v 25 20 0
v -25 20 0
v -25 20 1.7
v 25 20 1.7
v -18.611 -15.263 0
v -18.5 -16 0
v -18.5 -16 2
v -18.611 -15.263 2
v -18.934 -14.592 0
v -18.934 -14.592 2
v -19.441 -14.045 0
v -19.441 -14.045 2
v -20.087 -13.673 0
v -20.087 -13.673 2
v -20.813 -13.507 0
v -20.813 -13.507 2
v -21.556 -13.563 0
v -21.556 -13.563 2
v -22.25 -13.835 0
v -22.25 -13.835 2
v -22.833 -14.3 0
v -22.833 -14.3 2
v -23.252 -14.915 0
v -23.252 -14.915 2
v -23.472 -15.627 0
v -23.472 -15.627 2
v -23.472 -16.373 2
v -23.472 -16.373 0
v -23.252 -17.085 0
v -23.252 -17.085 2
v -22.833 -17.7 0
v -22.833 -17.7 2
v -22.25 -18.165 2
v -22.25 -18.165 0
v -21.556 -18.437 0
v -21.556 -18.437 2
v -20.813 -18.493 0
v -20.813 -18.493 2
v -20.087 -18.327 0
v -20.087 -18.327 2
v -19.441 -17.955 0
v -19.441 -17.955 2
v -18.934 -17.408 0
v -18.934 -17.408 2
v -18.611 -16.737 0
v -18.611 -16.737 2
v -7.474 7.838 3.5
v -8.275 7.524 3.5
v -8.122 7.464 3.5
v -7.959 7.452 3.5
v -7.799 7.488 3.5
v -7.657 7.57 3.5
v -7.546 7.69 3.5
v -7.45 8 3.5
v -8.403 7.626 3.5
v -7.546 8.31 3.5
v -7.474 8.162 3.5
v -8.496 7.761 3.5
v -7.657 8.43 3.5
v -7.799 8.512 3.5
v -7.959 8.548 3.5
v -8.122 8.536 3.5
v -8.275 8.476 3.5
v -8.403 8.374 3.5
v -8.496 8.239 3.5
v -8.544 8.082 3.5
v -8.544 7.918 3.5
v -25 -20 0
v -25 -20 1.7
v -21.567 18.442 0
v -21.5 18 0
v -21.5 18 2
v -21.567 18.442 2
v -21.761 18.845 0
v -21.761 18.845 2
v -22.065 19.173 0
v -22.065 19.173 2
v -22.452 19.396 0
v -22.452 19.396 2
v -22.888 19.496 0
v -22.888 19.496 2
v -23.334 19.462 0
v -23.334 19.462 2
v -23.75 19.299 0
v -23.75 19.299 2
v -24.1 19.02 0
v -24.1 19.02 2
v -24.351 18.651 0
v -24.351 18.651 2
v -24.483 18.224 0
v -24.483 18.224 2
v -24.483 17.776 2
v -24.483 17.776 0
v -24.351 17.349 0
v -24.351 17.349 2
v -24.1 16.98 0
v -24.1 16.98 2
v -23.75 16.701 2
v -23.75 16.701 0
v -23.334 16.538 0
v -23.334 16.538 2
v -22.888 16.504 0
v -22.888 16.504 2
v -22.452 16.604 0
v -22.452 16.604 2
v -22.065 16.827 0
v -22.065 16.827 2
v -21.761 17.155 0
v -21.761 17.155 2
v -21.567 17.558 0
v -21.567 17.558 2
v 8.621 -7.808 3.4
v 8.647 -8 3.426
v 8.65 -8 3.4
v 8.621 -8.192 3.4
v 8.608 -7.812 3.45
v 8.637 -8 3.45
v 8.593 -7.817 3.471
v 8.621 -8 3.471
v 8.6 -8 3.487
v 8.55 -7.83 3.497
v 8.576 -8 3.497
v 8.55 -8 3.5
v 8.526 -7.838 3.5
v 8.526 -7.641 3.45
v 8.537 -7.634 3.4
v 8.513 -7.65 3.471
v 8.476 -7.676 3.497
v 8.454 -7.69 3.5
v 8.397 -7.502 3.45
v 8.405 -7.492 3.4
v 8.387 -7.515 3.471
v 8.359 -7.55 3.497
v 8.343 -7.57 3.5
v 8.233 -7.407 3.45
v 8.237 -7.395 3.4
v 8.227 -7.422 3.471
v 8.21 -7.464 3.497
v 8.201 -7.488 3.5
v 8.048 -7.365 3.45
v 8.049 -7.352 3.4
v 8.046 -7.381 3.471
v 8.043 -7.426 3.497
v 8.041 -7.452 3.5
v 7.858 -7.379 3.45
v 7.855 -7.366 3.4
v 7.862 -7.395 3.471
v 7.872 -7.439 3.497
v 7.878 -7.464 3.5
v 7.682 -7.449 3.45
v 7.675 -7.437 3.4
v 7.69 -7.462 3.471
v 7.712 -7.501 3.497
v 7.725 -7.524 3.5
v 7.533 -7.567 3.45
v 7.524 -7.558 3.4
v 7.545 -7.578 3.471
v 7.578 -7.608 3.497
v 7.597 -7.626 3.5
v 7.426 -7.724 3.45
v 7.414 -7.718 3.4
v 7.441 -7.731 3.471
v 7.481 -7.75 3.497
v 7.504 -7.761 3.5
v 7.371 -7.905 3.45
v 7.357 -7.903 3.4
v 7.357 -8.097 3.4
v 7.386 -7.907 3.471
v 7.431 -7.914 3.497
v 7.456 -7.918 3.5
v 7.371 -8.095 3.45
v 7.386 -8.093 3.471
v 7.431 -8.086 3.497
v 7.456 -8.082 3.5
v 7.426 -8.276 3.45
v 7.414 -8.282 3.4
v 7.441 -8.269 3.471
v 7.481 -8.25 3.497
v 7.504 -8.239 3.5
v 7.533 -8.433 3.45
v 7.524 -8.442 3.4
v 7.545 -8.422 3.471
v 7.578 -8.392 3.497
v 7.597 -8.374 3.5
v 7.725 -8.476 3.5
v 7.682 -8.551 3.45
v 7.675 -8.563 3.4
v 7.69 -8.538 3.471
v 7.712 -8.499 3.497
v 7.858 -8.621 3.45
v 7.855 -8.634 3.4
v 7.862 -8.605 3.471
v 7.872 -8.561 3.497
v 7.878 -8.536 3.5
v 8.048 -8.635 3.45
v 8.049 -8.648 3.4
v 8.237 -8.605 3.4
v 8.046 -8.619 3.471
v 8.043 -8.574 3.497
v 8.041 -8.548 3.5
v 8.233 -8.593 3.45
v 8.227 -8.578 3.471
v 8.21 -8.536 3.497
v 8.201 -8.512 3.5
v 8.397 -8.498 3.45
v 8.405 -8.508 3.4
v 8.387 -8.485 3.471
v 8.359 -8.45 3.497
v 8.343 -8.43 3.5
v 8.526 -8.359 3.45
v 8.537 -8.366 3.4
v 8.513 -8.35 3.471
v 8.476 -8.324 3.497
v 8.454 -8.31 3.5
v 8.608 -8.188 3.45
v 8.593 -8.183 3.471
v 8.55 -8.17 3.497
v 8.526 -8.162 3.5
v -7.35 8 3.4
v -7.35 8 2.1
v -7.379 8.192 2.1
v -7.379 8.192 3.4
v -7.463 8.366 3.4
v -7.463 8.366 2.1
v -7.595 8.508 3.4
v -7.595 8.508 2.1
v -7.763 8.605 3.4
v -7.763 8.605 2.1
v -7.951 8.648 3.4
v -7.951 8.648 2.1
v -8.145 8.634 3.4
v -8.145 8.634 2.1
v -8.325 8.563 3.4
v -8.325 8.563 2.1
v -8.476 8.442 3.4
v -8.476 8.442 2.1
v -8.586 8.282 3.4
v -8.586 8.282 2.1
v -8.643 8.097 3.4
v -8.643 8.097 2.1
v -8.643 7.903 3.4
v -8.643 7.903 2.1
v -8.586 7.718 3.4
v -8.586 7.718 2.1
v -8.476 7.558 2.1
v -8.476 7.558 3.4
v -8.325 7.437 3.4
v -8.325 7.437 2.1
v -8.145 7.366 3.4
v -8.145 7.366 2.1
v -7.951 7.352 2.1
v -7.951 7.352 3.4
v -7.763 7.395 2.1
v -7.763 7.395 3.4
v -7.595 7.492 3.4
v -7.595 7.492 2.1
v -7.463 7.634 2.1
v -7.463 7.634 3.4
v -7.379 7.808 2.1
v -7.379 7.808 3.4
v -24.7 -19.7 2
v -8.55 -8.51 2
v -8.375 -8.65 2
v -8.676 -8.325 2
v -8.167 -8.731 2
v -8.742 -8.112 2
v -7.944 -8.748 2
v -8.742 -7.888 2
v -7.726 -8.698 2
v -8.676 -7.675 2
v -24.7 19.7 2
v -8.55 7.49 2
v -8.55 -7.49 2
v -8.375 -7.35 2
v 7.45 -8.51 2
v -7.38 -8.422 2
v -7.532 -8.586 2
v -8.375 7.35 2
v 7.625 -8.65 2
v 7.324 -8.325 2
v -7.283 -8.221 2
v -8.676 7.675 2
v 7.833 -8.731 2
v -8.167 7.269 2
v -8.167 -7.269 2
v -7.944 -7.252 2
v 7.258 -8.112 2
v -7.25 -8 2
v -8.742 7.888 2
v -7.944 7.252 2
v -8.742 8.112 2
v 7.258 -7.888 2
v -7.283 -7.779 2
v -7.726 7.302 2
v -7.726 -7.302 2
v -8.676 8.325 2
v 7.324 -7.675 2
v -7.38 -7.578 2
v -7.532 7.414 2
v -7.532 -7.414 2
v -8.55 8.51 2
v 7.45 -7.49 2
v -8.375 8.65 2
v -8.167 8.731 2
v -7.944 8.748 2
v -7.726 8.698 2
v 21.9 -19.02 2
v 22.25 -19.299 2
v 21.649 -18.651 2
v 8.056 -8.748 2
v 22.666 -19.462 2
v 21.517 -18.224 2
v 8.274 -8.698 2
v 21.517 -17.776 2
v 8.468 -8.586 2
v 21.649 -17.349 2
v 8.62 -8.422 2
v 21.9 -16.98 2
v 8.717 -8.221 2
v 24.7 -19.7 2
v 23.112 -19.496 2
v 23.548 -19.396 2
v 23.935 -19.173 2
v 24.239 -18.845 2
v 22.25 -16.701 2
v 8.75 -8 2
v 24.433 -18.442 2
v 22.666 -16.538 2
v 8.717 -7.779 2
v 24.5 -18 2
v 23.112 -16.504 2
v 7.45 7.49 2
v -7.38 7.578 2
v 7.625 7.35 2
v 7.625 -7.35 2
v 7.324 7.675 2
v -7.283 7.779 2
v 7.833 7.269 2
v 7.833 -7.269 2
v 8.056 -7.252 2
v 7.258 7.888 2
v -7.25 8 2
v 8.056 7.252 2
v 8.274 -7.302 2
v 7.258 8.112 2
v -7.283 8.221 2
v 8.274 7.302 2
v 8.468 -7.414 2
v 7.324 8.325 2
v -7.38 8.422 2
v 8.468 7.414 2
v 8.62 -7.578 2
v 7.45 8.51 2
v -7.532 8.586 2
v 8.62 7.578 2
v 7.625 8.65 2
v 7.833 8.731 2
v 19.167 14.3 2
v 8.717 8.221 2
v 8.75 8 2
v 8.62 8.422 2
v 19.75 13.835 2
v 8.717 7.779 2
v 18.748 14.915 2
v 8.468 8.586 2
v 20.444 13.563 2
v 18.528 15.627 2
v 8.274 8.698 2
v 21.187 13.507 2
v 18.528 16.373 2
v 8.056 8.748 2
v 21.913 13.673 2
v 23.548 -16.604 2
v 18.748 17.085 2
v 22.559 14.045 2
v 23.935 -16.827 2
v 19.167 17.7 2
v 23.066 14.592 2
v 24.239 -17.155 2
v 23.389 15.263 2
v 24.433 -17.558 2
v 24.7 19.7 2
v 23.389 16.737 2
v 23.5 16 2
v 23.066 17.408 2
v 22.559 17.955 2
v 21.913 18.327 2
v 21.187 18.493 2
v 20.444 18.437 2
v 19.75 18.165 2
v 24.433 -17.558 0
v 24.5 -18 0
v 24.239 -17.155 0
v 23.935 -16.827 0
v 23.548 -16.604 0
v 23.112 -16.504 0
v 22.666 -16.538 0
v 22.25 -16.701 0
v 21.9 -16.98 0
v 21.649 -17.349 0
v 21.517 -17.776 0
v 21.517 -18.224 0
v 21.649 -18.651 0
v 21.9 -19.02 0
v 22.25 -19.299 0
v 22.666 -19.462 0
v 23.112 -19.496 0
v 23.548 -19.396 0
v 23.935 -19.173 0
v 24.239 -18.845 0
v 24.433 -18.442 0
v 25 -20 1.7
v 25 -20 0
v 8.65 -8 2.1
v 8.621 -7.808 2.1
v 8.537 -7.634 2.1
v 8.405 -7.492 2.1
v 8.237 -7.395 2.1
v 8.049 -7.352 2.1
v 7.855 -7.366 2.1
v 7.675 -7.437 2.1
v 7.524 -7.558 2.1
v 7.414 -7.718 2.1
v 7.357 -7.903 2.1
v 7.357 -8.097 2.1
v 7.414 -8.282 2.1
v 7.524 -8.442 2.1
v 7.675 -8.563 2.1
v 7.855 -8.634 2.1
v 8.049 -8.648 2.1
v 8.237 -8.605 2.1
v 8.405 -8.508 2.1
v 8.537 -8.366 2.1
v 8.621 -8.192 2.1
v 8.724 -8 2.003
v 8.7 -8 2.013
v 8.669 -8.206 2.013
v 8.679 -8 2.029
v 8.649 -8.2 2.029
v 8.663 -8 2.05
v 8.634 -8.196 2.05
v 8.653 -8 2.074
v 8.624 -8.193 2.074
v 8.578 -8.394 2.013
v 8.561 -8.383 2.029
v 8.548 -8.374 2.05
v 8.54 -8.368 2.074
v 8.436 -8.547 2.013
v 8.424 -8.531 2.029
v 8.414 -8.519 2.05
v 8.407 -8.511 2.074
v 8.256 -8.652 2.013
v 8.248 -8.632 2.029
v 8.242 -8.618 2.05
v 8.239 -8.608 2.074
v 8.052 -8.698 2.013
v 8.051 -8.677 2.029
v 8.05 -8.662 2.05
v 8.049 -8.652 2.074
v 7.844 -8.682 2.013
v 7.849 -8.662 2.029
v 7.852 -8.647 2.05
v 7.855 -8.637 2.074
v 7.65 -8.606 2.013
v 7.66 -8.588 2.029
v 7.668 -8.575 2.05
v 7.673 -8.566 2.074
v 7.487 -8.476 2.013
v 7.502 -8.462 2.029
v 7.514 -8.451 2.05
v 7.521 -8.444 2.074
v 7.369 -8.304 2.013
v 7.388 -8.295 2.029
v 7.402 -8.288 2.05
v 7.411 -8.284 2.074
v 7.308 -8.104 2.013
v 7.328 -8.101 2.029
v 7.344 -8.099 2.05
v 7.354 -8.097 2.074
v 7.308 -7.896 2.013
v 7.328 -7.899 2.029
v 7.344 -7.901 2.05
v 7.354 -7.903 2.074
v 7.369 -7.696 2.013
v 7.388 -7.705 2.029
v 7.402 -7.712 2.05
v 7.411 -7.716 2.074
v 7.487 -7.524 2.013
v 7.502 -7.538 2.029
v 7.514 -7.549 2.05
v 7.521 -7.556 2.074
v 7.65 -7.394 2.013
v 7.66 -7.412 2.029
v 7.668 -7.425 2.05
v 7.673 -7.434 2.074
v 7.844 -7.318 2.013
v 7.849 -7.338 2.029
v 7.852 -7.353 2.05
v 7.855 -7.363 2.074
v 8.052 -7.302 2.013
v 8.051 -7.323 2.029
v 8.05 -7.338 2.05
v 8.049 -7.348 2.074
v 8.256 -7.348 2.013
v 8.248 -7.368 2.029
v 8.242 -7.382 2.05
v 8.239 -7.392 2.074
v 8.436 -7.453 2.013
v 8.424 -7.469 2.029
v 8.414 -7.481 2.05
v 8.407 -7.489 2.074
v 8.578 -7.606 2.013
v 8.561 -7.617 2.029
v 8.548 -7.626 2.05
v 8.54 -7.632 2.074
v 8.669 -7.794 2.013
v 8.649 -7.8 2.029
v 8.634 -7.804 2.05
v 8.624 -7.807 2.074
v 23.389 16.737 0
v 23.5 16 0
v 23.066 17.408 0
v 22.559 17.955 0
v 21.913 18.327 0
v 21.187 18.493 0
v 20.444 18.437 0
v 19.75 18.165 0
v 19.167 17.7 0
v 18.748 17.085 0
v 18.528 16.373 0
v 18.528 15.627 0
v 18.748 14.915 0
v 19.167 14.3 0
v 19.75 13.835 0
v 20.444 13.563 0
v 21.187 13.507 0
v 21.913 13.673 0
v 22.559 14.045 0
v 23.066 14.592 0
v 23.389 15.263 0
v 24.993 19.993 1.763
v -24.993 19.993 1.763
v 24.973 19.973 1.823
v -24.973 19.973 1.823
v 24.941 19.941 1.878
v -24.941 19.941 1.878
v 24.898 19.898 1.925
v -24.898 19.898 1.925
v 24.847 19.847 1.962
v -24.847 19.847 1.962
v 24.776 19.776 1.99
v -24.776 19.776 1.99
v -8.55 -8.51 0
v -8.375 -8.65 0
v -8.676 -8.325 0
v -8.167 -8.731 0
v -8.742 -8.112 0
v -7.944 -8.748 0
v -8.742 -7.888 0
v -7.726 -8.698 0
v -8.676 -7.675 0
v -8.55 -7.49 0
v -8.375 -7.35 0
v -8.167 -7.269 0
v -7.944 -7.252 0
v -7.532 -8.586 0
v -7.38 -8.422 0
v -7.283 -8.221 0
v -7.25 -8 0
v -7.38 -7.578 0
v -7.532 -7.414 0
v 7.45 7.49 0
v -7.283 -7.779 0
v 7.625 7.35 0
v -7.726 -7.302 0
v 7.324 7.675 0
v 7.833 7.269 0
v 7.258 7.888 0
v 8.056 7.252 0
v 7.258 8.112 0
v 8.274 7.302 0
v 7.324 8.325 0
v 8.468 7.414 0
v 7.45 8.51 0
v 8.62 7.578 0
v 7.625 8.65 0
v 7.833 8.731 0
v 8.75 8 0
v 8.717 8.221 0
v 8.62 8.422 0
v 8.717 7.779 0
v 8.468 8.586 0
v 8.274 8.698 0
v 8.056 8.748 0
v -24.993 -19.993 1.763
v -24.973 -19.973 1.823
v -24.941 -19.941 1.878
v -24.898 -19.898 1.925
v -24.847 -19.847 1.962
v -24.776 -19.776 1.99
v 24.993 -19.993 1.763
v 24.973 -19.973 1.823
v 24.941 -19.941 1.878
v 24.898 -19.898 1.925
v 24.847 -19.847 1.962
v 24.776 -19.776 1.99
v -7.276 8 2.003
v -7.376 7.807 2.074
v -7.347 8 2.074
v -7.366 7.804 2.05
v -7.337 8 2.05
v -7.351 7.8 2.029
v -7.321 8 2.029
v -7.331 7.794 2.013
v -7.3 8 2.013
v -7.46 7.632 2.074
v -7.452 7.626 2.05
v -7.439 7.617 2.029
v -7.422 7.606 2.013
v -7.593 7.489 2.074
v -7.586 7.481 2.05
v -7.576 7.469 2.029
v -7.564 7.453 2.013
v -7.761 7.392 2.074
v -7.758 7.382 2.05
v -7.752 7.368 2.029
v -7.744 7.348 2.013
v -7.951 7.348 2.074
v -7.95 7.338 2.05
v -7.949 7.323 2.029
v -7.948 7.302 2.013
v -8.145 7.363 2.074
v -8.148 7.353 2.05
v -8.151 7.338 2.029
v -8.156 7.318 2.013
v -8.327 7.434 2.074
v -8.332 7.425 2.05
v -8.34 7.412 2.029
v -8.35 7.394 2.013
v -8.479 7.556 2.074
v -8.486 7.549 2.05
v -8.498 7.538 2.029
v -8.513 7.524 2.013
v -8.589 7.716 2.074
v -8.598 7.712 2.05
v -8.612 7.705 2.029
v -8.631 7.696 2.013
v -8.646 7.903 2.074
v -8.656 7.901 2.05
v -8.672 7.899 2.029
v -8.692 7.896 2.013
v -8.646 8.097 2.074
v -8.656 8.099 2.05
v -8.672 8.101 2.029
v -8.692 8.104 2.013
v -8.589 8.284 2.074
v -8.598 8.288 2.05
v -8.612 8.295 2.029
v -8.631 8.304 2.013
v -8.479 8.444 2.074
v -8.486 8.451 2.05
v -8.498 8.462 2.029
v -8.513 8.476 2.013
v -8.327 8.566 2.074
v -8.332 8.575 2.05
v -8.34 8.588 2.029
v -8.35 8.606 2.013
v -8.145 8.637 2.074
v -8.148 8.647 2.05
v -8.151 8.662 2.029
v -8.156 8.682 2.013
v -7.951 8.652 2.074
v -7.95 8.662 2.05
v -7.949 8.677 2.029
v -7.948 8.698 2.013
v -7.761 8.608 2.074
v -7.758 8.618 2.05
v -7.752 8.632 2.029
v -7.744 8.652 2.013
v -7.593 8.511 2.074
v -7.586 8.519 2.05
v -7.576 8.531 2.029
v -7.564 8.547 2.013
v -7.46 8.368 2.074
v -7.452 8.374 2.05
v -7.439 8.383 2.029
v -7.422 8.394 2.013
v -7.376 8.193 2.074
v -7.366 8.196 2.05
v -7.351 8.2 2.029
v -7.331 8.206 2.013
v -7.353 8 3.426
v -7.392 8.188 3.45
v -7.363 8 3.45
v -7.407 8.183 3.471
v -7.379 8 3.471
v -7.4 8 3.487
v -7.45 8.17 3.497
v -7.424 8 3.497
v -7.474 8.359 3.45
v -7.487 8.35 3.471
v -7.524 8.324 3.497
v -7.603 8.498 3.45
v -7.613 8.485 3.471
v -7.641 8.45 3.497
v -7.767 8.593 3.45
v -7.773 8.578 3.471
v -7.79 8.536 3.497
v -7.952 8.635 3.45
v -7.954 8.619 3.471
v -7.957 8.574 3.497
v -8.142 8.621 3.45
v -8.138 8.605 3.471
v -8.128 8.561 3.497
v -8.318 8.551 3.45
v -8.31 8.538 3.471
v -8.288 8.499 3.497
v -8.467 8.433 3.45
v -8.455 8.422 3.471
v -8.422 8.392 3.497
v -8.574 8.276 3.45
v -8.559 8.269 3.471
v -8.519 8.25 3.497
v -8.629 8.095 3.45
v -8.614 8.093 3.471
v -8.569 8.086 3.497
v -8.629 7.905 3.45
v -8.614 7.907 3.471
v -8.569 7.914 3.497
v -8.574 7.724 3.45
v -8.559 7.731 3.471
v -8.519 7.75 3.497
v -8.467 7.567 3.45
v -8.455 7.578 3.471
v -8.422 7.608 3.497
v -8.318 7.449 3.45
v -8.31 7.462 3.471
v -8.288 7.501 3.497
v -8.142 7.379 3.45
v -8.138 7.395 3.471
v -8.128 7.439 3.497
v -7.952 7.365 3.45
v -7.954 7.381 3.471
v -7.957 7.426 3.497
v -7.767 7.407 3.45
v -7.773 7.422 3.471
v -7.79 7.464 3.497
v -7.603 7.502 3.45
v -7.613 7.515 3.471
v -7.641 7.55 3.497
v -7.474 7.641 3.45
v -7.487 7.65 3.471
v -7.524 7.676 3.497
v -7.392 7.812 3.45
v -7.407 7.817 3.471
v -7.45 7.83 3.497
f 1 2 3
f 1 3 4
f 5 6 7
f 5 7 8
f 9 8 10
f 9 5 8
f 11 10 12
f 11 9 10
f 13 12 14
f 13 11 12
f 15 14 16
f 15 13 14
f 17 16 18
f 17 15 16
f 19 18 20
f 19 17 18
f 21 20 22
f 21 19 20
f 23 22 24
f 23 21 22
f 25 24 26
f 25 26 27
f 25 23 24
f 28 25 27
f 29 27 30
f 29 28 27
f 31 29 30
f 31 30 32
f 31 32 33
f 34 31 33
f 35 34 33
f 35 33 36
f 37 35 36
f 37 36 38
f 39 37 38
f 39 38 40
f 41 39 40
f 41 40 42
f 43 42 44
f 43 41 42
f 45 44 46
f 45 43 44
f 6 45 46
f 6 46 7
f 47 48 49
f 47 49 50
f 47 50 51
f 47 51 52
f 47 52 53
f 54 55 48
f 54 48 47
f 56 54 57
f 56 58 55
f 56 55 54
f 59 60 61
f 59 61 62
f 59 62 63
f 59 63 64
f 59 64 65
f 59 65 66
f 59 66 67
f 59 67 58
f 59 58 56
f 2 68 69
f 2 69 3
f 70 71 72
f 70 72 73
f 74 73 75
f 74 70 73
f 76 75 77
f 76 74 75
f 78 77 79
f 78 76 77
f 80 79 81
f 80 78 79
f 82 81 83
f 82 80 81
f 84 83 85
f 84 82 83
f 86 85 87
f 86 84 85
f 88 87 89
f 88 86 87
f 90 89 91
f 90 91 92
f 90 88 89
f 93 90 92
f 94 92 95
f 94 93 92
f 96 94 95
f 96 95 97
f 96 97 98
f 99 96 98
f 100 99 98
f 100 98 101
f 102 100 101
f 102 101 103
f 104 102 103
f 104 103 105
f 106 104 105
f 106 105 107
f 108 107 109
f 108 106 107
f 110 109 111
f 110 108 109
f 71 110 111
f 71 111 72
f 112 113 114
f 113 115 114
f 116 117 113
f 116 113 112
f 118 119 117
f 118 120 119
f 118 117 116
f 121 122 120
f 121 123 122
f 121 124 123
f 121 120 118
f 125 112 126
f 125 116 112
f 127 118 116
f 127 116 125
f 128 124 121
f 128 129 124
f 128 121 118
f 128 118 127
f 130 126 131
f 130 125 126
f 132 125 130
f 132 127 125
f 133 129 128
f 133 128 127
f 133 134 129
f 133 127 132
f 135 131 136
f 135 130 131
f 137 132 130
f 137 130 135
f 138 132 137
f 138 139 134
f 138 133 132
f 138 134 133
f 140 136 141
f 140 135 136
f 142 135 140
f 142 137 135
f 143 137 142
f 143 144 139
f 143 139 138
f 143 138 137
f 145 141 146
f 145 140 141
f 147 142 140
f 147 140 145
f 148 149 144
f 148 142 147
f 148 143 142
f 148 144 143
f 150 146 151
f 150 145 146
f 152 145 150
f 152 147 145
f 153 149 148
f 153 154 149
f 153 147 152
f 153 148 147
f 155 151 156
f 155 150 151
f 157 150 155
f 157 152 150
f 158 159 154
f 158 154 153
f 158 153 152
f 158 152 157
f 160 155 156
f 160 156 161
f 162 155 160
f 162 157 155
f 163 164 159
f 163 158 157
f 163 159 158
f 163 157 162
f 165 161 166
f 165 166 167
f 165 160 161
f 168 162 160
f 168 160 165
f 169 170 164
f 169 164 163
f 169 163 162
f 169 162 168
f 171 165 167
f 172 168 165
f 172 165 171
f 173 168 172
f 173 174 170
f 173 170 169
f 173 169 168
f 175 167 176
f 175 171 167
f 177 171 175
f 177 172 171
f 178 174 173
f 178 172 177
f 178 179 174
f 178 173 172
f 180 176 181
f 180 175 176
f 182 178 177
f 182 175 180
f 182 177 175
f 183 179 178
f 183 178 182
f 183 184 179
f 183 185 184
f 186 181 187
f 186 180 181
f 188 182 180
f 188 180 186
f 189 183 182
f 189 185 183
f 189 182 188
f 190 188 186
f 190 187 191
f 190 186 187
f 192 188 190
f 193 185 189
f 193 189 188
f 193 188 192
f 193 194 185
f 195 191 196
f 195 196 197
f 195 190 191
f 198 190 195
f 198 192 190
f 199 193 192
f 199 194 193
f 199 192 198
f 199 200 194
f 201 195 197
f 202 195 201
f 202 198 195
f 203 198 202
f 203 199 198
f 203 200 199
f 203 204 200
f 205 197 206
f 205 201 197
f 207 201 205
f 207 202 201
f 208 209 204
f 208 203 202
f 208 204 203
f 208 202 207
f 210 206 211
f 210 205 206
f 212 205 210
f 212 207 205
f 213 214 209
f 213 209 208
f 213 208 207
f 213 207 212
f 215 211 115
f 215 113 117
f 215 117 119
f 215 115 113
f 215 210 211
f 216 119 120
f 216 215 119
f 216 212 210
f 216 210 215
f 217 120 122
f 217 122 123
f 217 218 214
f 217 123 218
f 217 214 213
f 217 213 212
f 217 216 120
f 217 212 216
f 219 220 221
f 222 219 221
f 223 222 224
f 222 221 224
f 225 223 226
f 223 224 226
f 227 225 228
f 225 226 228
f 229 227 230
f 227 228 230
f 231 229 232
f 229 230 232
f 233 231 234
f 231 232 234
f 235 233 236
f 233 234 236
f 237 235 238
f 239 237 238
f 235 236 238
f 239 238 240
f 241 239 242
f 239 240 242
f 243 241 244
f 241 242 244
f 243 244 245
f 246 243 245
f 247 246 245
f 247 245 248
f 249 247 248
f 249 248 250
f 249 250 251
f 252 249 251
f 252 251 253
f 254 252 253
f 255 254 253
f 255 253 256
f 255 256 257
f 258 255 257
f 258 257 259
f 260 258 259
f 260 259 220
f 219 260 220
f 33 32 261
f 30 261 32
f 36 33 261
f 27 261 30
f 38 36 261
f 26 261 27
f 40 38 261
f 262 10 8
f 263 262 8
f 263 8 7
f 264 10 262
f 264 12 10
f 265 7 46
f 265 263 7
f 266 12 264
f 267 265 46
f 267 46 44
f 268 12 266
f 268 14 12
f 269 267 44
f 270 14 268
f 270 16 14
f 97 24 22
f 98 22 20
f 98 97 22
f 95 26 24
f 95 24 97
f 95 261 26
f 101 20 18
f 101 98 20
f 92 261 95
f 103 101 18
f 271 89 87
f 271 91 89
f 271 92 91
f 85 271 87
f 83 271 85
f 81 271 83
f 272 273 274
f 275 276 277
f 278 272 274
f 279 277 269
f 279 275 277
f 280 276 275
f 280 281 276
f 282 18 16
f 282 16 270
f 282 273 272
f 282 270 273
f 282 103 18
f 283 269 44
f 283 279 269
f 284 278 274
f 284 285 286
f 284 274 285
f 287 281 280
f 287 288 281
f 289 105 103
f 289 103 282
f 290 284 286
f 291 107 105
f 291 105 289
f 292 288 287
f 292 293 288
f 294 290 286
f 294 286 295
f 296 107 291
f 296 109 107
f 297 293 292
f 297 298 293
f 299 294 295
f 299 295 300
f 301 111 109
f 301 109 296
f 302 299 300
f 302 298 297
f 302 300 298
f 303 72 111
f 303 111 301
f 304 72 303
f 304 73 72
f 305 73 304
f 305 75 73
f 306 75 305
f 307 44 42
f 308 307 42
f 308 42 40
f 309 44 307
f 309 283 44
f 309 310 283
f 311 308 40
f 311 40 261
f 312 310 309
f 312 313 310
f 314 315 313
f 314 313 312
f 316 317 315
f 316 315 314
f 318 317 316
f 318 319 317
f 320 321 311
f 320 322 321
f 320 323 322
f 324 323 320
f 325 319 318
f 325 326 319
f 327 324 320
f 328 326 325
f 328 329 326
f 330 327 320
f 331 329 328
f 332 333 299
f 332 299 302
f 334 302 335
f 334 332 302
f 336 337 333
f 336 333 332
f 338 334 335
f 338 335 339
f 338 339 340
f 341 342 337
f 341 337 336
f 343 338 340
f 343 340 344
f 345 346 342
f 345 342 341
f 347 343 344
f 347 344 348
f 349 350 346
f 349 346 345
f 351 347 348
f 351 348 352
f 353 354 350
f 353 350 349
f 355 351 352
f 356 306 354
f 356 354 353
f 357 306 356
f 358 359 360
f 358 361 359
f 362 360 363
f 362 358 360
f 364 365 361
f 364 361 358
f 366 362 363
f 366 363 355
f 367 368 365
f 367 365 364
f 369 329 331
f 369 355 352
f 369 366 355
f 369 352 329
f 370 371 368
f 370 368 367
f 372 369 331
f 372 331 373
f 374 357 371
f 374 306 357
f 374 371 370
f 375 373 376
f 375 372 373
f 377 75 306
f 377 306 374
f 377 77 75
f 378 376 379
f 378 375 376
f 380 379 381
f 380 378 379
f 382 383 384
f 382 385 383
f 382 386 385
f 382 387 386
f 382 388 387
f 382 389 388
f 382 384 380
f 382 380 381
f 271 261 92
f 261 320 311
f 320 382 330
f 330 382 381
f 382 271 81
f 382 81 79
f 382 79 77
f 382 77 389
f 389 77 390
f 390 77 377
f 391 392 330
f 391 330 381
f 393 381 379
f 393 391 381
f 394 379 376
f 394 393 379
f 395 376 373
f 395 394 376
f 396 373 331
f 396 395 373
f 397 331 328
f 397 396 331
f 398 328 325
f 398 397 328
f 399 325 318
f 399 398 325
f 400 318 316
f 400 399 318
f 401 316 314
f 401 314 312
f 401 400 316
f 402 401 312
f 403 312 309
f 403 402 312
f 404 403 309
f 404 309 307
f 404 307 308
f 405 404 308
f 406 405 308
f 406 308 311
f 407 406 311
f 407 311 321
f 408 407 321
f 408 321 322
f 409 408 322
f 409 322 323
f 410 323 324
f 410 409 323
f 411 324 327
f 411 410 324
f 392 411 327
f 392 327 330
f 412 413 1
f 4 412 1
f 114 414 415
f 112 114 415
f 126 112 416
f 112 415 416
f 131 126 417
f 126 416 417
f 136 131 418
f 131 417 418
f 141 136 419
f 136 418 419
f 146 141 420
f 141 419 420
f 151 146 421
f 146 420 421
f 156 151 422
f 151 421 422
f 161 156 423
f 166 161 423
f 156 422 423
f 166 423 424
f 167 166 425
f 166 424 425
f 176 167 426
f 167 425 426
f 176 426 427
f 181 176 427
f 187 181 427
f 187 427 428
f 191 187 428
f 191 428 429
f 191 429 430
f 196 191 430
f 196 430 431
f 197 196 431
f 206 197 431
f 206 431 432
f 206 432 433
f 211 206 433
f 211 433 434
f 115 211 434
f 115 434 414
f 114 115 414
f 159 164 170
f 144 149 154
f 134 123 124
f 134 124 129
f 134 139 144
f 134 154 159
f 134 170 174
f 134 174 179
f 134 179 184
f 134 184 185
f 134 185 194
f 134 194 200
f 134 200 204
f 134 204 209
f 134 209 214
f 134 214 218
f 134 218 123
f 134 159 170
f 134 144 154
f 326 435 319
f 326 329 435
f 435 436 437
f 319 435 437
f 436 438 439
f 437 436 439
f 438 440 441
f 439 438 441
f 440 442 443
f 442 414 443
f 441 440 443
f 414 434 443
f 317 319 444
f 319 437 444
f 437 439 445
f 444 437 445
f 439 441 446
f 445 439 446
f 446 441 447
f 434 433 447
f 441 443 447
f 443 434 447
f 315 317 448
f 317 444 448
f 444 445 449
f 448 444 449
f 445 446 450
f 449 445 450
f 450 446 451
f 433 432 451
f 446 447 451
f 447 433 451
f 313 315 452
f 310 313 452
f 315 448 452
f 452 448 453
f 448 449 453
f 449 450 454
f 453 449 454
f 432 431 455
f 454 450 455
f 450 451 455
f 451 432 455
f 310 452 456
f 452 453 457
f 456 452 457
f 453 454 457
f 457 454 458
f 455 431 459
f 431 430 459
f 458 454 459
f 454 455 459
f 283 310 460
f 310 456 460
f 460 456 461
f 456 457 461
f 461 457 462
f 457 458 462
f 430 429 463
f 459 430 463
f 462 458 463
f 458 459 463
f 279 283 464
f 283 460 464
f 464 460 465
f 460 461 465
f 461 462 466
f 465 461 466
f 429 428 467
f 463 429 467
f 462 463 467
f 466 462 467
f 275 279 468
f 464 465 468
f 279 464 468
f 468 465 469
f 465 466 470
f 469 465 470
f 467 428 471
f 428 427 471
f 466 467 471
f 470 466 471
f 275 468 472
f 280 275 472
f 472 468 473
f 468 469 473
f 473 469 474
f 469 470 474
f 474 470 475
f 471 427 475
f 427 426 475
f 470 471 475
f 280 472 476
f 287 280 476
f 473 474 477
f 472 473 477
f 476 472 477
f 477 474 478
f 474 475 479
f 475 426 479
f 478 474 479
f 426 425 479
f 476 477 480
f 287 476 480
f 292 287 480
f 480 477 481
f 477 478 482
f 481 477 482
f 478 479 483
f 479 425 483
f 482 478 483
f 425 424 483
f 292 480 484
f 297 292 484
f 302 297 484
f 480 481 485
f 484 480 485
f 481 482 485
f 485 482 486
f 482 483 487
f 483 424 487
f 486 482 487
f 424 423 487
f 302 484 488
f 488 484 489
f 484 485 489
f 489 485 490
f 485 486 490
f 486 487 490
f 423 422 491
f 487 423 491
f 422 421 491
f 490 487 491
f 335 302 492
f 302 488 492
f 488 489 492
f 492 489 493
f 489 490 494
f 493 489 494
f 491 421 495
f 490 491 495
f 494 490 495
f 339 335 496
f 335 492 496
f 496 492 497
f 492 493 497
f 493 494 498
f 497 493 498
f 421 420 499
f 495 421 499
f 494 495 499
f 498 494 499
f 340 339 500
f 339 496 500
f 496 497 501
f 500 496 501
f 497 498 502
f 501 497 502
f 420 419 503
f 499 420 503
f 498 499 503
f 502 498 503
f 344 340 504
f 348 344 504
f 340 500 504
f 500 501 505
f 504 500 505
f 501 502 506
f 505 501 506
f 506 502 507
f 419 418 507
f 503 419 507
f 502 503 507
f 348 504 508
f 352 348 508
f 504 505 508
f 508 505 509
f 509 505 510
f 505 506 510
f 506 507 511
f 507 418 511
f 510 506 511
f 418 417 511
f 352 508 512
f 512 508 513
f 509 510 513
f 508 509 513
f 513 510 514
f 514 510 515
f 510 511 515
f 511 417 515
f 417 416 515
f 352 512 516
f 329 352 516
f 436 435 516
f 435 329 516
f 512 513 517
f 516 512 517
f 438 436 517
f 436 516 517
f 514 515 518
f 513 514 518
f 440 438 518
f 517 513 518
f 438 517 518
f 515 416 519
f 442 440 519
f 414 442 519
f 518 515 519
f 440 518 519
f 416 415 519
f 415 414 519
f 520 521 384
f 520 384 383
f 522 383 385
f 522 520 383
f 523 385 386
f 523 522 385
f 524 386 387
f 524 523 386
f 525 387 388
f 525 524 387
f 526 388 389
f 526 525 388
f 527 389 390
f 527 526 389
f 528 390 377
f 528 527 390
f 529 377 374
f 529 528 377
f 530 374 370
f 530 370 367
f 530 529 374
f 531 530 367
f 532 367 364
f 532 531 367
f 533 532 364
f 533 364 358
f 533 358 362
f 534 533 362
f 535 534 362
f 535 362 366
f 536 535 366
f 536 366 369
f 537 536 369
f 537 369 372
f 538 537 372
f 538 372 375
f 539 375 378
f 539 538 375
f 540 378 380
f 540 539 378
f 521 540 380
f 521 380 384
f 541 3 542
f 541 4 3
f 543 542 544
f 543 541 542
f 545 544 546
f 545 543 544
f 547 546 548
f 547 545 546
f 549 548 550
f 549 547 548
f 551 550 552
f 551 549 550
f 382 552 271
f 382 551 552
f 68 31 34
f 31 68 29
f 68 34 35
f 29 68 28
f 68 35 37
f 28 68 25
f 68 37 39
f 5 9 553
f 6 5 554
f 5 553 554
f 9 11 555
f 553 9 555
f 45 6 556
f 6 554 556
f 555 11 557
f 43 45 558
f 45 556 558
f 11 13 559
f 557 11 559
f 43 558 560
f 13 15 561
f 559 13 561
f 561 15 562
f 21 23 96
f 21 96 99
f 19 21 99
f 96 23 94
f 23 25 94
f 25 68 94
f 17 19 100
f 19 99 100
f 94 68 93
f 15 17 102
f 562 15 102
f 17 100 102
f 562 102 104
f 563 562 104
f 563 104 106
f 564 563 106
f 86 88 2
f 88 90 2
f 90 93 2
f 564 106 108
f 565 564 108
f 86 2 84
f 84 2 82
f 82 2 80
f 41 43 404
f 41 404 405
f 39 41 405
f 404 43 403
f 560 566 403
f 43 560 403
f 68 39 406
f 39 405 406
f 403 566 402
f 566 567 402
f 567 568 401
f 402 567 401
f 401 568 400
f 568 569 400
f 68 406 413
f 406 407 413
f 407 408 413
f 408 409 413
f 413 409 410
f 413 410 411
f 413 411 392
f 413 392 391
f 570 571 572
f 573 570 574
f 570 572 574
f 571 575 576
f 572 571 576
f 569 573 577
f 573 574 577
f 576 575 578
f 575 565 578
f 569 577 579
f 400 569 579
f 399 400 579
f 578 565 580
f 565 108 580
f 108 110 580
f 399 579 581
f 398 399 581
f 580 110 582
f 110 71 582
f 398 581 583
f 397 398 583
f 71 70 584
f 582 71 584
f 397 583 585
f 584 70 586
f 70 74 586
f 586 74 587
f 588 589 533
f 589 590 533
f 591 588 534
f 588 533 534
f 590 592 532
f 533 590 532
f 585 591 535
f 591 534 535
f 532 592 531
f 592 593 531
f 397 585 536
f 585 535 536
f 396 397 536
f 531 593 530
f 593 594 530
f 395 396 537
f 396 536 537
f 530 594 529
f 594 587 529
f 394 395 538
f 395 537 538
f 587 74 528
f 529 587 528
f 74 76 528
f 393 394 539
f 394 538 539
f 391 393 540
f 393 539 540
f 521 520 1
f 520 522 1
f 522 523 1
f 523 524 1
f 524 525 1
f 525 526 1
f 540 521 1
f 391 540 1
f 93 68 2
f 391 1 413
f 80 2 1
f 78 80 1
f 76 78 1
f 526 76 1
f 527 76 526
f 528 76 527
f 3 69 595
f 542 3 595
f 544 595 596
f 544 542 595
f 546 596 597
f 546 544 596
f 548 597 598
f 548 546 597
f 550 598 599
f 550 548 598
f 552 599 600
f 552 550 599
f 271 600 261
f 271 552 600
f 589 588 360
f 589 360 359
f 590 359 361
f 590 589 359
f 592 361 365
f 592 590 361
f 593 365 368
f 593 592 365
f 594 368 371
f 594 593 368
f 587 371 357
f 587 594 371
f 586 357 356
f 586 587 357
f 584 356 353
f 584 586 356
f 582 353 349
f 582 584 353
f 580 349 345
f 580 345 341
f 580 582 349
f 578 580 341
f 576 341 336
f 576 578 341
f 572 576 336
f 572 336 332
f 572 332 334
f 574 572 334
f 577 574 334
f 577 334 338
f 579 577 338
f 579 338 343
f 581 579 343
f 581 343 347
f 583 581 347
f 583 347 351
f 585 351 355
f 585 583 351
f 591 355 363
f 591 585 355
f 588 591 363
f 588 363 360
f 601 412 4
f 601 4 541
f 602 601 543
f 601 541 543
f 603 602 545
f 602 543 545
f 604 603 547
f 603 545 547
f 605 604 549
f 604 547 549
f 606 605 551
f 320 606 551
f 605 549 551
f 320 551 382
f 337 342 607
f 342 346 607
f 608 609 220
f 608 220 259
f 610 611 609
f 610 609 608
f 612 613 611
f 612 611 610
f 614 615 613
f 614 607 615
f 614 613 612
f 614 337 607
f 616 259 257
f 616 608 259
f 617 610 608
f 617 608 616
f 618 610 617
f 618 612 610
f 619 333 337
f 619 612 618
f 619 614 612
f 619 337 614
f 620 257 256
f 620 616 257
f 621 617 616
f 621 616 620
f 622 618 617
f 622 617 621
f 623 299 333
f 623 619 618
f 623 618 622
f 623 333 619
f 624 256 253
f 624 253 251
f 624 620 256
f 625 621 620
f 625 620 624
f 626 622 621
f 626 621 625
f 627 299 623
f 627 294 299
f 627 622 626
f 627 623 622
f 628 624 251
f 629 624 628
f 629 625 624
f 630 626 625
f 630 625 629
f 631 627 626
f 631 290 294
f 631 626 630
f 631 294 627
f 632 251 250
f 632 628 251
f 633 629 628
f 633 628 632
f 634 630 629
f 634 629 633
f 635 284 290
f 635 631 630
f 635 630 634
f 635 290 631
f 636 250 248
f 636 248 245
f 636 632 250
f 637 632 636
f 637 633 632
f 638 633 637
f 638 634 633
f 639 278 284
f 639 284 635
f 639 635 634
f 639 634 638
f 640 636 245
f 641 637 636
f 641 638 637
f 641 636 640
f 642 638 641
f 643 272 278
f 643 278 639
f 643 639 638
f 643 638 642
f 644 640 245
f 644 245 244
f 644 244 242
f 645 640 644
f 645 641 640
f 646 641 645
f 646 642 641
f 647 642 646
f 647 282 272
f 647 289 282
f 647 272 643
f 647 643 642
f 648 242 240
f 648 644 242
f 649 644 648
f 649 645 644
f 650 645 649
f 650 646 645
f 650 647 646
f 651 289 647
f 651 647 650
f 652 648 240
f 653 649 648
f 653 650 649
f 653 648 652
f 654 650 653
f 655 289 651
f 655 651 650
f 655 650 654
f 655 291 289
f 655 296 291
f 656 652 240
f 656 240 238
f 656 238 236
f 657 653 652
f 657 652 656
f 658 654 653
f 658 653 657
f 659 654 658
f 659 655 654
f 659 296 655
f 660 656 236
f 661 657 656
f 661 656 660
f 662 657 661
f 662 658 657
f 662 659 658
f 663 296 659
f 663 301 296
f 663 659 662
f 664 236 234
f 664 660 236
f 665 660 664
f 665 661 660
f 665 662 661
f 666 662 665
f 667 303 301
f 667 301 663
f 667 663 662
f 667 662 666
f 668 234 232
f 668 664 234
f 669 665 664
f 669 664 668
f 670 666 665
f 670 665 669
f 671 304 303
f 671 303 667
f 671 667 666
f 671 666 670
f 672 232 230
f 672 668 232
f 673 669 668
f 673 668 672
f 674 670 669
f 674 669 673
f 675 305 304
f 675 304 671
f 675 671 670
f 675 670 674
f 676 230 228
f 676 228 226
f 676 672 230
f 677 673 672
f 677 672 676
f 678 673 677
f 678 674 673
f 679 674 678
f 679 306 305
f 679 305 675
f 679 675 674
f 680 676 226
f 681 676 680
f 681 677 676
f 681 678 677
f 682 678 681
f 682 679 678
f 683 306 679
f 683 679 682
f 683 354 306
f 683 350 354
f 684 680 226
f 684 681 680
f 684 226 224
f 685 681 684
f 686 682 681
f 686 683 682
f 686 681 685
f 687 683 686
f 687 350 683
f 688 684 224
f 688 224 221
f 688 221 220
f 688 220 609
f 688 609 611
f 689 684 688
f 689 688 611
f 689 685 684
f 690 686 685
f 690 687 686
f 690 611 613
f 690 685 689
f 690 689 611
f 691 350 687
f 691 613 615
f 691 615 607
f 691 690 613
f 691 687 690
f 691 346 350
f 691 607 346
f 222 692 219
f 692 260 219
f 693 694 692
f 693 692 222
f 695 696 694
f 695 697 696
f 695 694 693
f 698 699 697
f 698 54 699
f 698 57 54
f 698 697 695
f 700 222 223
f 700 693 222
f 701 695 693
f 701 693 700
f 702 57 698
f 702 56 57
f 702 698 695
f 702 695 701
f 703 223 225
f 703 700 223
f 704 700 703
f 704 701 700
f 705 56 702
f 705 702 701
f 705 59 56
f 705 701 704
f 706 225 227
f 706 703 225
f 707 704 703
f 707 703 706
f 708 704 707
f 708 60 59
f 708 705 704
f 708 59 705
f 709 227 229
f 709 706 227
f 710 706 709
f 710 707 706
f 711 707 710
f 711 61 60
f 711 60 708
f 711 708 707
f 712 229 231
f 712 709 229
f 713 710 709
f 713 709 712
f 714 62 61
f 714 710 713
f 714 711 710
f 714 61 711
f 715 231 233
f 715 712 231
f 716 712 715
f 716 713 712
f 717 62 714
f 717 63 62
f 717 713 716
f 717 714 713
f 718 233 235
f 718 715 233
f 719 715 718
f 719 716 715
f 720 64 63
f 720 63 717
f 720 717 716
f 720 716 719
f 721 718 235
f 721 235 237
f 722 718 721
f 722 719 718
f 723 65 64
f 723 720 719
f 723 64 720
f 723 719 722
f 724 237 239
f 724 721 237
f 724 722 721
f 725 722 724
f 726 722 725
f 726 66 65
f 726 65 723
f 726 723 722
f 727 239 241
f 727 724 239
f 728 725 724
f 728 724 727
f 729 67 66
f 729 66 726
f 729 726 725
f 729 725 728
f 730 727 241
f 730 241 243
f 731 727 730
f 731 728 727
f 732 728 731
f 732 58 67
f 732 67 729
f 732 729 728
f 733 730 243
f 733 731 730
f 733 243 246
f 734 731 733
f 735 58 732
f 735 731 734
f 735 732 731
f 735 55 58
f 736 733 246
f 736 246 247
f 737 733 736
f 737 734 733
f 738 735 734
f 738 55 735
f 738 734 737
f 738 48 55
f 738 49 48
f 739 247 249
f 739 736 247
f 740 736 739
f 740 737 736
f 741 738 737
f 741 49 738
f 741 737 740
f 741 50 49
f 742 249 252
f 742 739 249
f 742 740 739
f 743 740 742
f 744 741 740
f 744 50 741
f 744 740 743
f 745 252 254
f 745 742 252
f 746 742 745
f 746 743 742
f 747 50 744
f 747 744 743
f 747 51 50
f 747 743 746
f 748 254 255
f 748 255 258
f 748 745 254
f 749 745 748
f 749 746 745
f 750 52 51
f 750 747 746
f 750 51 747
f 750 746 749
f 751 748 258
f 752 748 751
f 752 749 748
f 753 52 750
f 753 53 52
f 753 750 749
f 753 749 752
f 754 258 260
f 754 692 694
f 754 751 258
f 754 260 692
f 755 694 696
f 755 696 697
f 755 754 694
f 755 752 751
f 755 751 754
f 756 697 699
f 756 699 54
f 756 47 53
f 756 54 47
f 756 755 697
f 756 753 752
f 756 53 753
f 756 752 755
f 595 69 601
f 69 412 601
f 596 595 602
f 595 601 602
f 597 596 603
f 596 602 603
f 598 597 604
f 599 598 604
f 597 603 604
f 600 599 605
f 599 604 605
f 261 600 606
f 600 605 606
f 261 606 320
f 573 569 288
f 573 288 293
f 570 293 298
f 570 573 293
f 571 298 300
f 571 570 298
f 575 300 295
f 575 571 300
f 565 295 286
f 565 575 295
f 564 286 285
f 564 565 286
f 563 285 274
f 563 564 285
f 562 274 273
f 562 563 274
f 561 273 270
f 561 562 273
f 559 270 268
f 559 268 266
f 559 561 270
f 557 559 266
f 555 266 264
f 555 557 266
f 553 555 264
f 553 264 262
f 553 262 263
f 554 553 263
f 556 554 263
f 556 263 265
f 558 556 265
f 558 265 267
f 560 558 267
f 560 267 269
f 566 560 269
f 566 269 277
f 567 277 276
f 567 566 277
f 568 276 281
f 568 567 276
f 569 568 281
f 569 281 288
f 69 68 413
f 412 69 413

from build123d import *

# Parameters (mm, degrees)
SKETCH1_W           = 50
SKETCH1_H           = 40
SKETCH1_R           = 1.5
SKETCH1_R_2         = 0.75
SKETCH1_R_3         = 2.5
BOSS_EXTRUDE1_DEPTH = 2
FILLET1_R           = 0.3
BOSS_EXTRUDE2_START = 1
SKETCH2_R           = 0.65
BOSS_EXTRUDE2_DEPTH = 2.5
FILLET2_R           = 0.1


with BuildPart() as part:
    # Sketch1 → Boss-Extrude1 (new body)
    with BuildSketch(Plane.XY):
        Rectangle(SKETCH1_W, SKETCH1_H)
        with Locations((-23, 18)):
            Circle(SKETCH1_R, mode=Mode.SUBTRACT)
        with Locations((23, -18)):
            Circle(SKETCH1_R, mode=Mode.SUBTRACT)
        with Locations((8, 8)):
            Circle(SKETCH1_R_2, mode=Mode.SUBTRACT)
        with Locations((-8, -8)):
            Circle(SKETCH1_R_2, mode=Mode.SUBTRACT)
        with Locations((-21, -16)):
            Circle(SKETCH1_R_3, mode=Mode.SUBTRACT)
        with Locations((21, 16)):
            Circle(SKETCH1_R_3, mode=Mode.SUBTRACT)
    extrude(amount=BOSS_EXTRUDE1_DEPTH)

    # Fillet1
    fillet1_edges = [part.edges().sort_by_distance(p)[0] for p in [
        (-25, 0, 2),
        (0, -20, 2),
        (25, 0, 2),
        (0, 20, 2),
    ]]
    fillet(fillet1_edges, radius=FILLET1_R)

    # Sketch2 → Boss-Extrude2 (add)
    with BuildSketch(Plane.XY.offset(BOSS_EXTRUDE2_START)):
        with Locations((-8, 8)):
            Circle(SKETCH2_R)
        with Locations((8, -8)):
            Circle(SKETCH2_R)
    extrude(amount=BOSS_EXTRUDE2_DEPTH)

    # Fillet2
    fillet2_edges = [part.edges().sort_by_distance(p)[0] for p in [
        (-8.65, 8, 2),
        (-8.65, 8, 3.5),
        (7.35, -8, 2),
        (7.35, -8, 3.5),
    ]]
    fillet(fillet2_edges, radius=FILLET2_R)


solid = part.part
